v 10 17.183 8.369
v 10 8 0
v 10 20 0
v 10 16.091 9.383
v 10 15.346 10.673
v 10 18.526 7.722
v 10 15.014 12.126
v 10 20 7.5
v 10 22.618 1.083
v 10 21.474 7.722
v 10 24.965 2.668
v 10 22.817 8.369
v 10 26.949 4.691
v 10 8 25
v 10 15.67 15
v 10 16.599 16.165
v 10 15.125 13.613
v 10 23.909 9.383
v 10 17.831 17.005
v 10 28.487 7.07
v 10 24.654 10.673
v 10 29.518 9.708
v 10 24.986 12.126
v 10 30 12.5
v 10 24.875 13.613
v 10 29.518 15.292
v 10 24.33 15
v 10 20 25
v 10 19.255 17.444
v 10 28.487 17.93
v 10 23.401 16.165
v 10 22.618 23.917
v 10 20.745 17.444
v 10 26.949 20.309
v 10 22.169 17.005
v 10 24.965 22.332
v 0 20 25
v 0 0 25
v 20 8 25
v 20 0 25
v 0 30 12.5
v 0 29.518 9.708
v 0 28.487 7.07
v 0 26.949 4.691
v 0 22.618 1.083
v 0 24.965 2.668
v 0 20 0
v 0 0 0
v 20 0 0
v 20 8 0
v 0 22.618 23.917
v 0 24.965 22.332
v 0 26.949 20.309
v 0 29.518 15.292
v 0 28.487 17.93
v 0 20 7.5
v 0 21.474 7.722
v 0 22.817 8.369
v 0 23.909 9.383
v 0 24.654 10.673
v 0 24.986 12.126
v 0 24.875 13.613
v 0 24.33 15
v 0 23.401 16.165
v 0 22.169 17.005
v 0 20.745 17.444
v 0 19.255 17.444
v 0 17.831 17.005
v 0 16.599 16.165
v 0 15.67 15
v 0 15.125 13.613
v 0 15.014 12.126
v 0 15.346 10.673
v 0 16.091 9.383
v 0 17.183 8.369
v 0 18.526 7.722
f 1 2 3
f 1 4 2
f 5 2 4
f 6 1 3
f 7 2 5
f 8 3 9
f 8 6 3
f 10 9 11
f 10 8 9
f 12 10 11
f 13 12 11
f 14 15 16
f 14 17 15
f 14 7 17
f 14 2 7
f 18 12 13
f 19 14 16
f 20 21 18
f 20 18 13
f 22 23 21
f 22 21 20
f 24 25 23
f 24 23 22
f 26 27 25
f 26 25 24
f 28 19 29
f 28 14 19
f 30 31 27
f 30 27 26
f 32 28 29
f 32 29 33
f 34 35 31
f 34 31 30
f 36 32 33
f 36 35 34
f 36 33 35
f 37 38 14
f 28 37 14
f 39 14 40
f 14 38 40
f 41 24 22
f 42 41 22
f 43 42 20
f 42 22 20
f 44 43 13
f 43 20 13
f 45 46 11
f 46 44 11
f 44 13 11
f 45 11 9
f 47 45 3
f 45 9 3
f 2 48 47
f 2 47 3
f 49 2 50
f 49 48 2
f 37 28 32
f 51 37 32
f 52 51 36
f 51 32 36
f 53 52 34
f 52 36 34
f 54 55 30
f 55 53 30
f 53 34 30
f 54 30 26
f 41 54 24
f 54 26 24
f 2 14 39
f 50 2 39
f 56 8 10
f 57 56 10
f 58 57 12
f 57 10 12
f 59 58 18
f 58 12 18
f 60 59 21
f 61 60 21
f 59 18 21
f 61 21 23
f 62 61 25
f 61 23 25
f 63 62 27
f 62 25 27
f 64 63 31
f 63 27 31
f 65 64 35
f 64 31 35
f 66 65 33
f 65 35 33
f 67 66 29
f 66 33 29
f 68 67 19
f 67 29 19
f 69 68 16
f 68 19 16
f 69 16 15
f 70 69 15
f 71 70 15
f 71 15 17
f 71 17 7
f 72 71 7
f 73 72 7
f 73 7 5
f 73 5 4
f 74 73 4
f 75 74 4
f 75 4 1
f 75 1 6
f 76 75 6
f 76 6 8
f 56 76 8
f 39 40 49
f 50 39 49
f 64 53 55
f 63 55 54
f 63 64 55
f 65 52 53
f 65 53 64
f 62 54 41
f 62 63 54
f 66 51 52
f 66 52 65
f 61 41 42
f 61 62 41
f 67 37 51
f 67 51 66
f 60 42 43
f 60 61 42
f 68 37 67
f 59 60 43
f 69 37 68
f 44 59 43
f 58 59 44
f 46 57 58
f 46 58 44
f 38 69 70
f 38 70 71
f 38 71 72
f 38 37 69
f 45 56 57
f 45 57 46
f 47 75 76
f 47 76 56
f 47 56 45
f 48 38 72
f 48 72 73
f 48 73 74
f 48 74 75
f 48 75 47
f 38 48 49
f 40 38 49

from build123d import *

# Parameters (mm, degrees)
CROQUIS1_W              = 20
CROQUIS1_H              = 25
SALIENTE_EXTRUIR1_DEPTH = 30
CROQUIS2_W              = 10
CROQUIS2_H              = 22
CORTAR_EXTRUIR1_DEPTH   = 30
CORTAR_EXTRUIR3_DEPTH   = 30
CROQUIS7_R              = 5
CORTAR_EXTRUIR4_DEPTH   = 30


with BuildPart() as part:
    # Croquis1 → Saliente-Extruir1 (new body)
    with BuildSketch(Plane(origin=(0, 0, 0), x_dir=(1, 0, 0), z_dir=(0, 1, 0))):
        with Locations((10, -12.5)):
            Rectangle(CROQUIS1_W, CROQUIS1_H)
    extrude(amount=SALIENTE_EXTRUIR1_DEPTH)

    # Croquis2 → Cortar-Extruir1 (cut)
    with BuildSketch(Plane.XY.offset(25)):
        with Locations((15, 19)):
            Rectangle(CROQUIS2_W, CROQUIS2_H)
    extrude(amount=-CORTAR_EXTRUIR1_DEPTH, mode=Mode.SUBTRACT)

    # Croquis6 → Cortar-Extruir3 (cut)
    with BuildSketch(Plane(origin=(10, 0, 0), x_dir=(0, 0, -1), z_dir=(1, 0, 0))):
        with BuildLine():
            Line((-25, 30), (-25, 20))
            ThreePointArc((-25, 20), (-20.308873363, 26.948591704), (-12.5, 30))
            Line((-12.5, 30), (-25, 30))
        make_face()
        with BuildLine():
            ThreePointArc((-12.5, 30), (-4.691126637, 26.948591704), (0, 20))
            Line((0, 20), (0, 30))
            Line((0, 30), (-12.5, 30))
        make_face()
    extrude(amount=-CORTAR_EXTRUIR3_DEPTH, mode=Mode.SUBTRACT)

    # Croquis7 → Cortar-Extruir4 (cut)
    with BuildSketch(Plane(origin=(10, 0, 0), x_dir=(0, 0, -1), z_dir=(1, 0, 0))):
        with Locations((-12.5, 20)):
            Circle(CROQUIS7_R)
    extrude(amount=-CORTAR_EXTRUIR4_DEPTH, mode=Mode.SUBTRACT)


solid = part.part
